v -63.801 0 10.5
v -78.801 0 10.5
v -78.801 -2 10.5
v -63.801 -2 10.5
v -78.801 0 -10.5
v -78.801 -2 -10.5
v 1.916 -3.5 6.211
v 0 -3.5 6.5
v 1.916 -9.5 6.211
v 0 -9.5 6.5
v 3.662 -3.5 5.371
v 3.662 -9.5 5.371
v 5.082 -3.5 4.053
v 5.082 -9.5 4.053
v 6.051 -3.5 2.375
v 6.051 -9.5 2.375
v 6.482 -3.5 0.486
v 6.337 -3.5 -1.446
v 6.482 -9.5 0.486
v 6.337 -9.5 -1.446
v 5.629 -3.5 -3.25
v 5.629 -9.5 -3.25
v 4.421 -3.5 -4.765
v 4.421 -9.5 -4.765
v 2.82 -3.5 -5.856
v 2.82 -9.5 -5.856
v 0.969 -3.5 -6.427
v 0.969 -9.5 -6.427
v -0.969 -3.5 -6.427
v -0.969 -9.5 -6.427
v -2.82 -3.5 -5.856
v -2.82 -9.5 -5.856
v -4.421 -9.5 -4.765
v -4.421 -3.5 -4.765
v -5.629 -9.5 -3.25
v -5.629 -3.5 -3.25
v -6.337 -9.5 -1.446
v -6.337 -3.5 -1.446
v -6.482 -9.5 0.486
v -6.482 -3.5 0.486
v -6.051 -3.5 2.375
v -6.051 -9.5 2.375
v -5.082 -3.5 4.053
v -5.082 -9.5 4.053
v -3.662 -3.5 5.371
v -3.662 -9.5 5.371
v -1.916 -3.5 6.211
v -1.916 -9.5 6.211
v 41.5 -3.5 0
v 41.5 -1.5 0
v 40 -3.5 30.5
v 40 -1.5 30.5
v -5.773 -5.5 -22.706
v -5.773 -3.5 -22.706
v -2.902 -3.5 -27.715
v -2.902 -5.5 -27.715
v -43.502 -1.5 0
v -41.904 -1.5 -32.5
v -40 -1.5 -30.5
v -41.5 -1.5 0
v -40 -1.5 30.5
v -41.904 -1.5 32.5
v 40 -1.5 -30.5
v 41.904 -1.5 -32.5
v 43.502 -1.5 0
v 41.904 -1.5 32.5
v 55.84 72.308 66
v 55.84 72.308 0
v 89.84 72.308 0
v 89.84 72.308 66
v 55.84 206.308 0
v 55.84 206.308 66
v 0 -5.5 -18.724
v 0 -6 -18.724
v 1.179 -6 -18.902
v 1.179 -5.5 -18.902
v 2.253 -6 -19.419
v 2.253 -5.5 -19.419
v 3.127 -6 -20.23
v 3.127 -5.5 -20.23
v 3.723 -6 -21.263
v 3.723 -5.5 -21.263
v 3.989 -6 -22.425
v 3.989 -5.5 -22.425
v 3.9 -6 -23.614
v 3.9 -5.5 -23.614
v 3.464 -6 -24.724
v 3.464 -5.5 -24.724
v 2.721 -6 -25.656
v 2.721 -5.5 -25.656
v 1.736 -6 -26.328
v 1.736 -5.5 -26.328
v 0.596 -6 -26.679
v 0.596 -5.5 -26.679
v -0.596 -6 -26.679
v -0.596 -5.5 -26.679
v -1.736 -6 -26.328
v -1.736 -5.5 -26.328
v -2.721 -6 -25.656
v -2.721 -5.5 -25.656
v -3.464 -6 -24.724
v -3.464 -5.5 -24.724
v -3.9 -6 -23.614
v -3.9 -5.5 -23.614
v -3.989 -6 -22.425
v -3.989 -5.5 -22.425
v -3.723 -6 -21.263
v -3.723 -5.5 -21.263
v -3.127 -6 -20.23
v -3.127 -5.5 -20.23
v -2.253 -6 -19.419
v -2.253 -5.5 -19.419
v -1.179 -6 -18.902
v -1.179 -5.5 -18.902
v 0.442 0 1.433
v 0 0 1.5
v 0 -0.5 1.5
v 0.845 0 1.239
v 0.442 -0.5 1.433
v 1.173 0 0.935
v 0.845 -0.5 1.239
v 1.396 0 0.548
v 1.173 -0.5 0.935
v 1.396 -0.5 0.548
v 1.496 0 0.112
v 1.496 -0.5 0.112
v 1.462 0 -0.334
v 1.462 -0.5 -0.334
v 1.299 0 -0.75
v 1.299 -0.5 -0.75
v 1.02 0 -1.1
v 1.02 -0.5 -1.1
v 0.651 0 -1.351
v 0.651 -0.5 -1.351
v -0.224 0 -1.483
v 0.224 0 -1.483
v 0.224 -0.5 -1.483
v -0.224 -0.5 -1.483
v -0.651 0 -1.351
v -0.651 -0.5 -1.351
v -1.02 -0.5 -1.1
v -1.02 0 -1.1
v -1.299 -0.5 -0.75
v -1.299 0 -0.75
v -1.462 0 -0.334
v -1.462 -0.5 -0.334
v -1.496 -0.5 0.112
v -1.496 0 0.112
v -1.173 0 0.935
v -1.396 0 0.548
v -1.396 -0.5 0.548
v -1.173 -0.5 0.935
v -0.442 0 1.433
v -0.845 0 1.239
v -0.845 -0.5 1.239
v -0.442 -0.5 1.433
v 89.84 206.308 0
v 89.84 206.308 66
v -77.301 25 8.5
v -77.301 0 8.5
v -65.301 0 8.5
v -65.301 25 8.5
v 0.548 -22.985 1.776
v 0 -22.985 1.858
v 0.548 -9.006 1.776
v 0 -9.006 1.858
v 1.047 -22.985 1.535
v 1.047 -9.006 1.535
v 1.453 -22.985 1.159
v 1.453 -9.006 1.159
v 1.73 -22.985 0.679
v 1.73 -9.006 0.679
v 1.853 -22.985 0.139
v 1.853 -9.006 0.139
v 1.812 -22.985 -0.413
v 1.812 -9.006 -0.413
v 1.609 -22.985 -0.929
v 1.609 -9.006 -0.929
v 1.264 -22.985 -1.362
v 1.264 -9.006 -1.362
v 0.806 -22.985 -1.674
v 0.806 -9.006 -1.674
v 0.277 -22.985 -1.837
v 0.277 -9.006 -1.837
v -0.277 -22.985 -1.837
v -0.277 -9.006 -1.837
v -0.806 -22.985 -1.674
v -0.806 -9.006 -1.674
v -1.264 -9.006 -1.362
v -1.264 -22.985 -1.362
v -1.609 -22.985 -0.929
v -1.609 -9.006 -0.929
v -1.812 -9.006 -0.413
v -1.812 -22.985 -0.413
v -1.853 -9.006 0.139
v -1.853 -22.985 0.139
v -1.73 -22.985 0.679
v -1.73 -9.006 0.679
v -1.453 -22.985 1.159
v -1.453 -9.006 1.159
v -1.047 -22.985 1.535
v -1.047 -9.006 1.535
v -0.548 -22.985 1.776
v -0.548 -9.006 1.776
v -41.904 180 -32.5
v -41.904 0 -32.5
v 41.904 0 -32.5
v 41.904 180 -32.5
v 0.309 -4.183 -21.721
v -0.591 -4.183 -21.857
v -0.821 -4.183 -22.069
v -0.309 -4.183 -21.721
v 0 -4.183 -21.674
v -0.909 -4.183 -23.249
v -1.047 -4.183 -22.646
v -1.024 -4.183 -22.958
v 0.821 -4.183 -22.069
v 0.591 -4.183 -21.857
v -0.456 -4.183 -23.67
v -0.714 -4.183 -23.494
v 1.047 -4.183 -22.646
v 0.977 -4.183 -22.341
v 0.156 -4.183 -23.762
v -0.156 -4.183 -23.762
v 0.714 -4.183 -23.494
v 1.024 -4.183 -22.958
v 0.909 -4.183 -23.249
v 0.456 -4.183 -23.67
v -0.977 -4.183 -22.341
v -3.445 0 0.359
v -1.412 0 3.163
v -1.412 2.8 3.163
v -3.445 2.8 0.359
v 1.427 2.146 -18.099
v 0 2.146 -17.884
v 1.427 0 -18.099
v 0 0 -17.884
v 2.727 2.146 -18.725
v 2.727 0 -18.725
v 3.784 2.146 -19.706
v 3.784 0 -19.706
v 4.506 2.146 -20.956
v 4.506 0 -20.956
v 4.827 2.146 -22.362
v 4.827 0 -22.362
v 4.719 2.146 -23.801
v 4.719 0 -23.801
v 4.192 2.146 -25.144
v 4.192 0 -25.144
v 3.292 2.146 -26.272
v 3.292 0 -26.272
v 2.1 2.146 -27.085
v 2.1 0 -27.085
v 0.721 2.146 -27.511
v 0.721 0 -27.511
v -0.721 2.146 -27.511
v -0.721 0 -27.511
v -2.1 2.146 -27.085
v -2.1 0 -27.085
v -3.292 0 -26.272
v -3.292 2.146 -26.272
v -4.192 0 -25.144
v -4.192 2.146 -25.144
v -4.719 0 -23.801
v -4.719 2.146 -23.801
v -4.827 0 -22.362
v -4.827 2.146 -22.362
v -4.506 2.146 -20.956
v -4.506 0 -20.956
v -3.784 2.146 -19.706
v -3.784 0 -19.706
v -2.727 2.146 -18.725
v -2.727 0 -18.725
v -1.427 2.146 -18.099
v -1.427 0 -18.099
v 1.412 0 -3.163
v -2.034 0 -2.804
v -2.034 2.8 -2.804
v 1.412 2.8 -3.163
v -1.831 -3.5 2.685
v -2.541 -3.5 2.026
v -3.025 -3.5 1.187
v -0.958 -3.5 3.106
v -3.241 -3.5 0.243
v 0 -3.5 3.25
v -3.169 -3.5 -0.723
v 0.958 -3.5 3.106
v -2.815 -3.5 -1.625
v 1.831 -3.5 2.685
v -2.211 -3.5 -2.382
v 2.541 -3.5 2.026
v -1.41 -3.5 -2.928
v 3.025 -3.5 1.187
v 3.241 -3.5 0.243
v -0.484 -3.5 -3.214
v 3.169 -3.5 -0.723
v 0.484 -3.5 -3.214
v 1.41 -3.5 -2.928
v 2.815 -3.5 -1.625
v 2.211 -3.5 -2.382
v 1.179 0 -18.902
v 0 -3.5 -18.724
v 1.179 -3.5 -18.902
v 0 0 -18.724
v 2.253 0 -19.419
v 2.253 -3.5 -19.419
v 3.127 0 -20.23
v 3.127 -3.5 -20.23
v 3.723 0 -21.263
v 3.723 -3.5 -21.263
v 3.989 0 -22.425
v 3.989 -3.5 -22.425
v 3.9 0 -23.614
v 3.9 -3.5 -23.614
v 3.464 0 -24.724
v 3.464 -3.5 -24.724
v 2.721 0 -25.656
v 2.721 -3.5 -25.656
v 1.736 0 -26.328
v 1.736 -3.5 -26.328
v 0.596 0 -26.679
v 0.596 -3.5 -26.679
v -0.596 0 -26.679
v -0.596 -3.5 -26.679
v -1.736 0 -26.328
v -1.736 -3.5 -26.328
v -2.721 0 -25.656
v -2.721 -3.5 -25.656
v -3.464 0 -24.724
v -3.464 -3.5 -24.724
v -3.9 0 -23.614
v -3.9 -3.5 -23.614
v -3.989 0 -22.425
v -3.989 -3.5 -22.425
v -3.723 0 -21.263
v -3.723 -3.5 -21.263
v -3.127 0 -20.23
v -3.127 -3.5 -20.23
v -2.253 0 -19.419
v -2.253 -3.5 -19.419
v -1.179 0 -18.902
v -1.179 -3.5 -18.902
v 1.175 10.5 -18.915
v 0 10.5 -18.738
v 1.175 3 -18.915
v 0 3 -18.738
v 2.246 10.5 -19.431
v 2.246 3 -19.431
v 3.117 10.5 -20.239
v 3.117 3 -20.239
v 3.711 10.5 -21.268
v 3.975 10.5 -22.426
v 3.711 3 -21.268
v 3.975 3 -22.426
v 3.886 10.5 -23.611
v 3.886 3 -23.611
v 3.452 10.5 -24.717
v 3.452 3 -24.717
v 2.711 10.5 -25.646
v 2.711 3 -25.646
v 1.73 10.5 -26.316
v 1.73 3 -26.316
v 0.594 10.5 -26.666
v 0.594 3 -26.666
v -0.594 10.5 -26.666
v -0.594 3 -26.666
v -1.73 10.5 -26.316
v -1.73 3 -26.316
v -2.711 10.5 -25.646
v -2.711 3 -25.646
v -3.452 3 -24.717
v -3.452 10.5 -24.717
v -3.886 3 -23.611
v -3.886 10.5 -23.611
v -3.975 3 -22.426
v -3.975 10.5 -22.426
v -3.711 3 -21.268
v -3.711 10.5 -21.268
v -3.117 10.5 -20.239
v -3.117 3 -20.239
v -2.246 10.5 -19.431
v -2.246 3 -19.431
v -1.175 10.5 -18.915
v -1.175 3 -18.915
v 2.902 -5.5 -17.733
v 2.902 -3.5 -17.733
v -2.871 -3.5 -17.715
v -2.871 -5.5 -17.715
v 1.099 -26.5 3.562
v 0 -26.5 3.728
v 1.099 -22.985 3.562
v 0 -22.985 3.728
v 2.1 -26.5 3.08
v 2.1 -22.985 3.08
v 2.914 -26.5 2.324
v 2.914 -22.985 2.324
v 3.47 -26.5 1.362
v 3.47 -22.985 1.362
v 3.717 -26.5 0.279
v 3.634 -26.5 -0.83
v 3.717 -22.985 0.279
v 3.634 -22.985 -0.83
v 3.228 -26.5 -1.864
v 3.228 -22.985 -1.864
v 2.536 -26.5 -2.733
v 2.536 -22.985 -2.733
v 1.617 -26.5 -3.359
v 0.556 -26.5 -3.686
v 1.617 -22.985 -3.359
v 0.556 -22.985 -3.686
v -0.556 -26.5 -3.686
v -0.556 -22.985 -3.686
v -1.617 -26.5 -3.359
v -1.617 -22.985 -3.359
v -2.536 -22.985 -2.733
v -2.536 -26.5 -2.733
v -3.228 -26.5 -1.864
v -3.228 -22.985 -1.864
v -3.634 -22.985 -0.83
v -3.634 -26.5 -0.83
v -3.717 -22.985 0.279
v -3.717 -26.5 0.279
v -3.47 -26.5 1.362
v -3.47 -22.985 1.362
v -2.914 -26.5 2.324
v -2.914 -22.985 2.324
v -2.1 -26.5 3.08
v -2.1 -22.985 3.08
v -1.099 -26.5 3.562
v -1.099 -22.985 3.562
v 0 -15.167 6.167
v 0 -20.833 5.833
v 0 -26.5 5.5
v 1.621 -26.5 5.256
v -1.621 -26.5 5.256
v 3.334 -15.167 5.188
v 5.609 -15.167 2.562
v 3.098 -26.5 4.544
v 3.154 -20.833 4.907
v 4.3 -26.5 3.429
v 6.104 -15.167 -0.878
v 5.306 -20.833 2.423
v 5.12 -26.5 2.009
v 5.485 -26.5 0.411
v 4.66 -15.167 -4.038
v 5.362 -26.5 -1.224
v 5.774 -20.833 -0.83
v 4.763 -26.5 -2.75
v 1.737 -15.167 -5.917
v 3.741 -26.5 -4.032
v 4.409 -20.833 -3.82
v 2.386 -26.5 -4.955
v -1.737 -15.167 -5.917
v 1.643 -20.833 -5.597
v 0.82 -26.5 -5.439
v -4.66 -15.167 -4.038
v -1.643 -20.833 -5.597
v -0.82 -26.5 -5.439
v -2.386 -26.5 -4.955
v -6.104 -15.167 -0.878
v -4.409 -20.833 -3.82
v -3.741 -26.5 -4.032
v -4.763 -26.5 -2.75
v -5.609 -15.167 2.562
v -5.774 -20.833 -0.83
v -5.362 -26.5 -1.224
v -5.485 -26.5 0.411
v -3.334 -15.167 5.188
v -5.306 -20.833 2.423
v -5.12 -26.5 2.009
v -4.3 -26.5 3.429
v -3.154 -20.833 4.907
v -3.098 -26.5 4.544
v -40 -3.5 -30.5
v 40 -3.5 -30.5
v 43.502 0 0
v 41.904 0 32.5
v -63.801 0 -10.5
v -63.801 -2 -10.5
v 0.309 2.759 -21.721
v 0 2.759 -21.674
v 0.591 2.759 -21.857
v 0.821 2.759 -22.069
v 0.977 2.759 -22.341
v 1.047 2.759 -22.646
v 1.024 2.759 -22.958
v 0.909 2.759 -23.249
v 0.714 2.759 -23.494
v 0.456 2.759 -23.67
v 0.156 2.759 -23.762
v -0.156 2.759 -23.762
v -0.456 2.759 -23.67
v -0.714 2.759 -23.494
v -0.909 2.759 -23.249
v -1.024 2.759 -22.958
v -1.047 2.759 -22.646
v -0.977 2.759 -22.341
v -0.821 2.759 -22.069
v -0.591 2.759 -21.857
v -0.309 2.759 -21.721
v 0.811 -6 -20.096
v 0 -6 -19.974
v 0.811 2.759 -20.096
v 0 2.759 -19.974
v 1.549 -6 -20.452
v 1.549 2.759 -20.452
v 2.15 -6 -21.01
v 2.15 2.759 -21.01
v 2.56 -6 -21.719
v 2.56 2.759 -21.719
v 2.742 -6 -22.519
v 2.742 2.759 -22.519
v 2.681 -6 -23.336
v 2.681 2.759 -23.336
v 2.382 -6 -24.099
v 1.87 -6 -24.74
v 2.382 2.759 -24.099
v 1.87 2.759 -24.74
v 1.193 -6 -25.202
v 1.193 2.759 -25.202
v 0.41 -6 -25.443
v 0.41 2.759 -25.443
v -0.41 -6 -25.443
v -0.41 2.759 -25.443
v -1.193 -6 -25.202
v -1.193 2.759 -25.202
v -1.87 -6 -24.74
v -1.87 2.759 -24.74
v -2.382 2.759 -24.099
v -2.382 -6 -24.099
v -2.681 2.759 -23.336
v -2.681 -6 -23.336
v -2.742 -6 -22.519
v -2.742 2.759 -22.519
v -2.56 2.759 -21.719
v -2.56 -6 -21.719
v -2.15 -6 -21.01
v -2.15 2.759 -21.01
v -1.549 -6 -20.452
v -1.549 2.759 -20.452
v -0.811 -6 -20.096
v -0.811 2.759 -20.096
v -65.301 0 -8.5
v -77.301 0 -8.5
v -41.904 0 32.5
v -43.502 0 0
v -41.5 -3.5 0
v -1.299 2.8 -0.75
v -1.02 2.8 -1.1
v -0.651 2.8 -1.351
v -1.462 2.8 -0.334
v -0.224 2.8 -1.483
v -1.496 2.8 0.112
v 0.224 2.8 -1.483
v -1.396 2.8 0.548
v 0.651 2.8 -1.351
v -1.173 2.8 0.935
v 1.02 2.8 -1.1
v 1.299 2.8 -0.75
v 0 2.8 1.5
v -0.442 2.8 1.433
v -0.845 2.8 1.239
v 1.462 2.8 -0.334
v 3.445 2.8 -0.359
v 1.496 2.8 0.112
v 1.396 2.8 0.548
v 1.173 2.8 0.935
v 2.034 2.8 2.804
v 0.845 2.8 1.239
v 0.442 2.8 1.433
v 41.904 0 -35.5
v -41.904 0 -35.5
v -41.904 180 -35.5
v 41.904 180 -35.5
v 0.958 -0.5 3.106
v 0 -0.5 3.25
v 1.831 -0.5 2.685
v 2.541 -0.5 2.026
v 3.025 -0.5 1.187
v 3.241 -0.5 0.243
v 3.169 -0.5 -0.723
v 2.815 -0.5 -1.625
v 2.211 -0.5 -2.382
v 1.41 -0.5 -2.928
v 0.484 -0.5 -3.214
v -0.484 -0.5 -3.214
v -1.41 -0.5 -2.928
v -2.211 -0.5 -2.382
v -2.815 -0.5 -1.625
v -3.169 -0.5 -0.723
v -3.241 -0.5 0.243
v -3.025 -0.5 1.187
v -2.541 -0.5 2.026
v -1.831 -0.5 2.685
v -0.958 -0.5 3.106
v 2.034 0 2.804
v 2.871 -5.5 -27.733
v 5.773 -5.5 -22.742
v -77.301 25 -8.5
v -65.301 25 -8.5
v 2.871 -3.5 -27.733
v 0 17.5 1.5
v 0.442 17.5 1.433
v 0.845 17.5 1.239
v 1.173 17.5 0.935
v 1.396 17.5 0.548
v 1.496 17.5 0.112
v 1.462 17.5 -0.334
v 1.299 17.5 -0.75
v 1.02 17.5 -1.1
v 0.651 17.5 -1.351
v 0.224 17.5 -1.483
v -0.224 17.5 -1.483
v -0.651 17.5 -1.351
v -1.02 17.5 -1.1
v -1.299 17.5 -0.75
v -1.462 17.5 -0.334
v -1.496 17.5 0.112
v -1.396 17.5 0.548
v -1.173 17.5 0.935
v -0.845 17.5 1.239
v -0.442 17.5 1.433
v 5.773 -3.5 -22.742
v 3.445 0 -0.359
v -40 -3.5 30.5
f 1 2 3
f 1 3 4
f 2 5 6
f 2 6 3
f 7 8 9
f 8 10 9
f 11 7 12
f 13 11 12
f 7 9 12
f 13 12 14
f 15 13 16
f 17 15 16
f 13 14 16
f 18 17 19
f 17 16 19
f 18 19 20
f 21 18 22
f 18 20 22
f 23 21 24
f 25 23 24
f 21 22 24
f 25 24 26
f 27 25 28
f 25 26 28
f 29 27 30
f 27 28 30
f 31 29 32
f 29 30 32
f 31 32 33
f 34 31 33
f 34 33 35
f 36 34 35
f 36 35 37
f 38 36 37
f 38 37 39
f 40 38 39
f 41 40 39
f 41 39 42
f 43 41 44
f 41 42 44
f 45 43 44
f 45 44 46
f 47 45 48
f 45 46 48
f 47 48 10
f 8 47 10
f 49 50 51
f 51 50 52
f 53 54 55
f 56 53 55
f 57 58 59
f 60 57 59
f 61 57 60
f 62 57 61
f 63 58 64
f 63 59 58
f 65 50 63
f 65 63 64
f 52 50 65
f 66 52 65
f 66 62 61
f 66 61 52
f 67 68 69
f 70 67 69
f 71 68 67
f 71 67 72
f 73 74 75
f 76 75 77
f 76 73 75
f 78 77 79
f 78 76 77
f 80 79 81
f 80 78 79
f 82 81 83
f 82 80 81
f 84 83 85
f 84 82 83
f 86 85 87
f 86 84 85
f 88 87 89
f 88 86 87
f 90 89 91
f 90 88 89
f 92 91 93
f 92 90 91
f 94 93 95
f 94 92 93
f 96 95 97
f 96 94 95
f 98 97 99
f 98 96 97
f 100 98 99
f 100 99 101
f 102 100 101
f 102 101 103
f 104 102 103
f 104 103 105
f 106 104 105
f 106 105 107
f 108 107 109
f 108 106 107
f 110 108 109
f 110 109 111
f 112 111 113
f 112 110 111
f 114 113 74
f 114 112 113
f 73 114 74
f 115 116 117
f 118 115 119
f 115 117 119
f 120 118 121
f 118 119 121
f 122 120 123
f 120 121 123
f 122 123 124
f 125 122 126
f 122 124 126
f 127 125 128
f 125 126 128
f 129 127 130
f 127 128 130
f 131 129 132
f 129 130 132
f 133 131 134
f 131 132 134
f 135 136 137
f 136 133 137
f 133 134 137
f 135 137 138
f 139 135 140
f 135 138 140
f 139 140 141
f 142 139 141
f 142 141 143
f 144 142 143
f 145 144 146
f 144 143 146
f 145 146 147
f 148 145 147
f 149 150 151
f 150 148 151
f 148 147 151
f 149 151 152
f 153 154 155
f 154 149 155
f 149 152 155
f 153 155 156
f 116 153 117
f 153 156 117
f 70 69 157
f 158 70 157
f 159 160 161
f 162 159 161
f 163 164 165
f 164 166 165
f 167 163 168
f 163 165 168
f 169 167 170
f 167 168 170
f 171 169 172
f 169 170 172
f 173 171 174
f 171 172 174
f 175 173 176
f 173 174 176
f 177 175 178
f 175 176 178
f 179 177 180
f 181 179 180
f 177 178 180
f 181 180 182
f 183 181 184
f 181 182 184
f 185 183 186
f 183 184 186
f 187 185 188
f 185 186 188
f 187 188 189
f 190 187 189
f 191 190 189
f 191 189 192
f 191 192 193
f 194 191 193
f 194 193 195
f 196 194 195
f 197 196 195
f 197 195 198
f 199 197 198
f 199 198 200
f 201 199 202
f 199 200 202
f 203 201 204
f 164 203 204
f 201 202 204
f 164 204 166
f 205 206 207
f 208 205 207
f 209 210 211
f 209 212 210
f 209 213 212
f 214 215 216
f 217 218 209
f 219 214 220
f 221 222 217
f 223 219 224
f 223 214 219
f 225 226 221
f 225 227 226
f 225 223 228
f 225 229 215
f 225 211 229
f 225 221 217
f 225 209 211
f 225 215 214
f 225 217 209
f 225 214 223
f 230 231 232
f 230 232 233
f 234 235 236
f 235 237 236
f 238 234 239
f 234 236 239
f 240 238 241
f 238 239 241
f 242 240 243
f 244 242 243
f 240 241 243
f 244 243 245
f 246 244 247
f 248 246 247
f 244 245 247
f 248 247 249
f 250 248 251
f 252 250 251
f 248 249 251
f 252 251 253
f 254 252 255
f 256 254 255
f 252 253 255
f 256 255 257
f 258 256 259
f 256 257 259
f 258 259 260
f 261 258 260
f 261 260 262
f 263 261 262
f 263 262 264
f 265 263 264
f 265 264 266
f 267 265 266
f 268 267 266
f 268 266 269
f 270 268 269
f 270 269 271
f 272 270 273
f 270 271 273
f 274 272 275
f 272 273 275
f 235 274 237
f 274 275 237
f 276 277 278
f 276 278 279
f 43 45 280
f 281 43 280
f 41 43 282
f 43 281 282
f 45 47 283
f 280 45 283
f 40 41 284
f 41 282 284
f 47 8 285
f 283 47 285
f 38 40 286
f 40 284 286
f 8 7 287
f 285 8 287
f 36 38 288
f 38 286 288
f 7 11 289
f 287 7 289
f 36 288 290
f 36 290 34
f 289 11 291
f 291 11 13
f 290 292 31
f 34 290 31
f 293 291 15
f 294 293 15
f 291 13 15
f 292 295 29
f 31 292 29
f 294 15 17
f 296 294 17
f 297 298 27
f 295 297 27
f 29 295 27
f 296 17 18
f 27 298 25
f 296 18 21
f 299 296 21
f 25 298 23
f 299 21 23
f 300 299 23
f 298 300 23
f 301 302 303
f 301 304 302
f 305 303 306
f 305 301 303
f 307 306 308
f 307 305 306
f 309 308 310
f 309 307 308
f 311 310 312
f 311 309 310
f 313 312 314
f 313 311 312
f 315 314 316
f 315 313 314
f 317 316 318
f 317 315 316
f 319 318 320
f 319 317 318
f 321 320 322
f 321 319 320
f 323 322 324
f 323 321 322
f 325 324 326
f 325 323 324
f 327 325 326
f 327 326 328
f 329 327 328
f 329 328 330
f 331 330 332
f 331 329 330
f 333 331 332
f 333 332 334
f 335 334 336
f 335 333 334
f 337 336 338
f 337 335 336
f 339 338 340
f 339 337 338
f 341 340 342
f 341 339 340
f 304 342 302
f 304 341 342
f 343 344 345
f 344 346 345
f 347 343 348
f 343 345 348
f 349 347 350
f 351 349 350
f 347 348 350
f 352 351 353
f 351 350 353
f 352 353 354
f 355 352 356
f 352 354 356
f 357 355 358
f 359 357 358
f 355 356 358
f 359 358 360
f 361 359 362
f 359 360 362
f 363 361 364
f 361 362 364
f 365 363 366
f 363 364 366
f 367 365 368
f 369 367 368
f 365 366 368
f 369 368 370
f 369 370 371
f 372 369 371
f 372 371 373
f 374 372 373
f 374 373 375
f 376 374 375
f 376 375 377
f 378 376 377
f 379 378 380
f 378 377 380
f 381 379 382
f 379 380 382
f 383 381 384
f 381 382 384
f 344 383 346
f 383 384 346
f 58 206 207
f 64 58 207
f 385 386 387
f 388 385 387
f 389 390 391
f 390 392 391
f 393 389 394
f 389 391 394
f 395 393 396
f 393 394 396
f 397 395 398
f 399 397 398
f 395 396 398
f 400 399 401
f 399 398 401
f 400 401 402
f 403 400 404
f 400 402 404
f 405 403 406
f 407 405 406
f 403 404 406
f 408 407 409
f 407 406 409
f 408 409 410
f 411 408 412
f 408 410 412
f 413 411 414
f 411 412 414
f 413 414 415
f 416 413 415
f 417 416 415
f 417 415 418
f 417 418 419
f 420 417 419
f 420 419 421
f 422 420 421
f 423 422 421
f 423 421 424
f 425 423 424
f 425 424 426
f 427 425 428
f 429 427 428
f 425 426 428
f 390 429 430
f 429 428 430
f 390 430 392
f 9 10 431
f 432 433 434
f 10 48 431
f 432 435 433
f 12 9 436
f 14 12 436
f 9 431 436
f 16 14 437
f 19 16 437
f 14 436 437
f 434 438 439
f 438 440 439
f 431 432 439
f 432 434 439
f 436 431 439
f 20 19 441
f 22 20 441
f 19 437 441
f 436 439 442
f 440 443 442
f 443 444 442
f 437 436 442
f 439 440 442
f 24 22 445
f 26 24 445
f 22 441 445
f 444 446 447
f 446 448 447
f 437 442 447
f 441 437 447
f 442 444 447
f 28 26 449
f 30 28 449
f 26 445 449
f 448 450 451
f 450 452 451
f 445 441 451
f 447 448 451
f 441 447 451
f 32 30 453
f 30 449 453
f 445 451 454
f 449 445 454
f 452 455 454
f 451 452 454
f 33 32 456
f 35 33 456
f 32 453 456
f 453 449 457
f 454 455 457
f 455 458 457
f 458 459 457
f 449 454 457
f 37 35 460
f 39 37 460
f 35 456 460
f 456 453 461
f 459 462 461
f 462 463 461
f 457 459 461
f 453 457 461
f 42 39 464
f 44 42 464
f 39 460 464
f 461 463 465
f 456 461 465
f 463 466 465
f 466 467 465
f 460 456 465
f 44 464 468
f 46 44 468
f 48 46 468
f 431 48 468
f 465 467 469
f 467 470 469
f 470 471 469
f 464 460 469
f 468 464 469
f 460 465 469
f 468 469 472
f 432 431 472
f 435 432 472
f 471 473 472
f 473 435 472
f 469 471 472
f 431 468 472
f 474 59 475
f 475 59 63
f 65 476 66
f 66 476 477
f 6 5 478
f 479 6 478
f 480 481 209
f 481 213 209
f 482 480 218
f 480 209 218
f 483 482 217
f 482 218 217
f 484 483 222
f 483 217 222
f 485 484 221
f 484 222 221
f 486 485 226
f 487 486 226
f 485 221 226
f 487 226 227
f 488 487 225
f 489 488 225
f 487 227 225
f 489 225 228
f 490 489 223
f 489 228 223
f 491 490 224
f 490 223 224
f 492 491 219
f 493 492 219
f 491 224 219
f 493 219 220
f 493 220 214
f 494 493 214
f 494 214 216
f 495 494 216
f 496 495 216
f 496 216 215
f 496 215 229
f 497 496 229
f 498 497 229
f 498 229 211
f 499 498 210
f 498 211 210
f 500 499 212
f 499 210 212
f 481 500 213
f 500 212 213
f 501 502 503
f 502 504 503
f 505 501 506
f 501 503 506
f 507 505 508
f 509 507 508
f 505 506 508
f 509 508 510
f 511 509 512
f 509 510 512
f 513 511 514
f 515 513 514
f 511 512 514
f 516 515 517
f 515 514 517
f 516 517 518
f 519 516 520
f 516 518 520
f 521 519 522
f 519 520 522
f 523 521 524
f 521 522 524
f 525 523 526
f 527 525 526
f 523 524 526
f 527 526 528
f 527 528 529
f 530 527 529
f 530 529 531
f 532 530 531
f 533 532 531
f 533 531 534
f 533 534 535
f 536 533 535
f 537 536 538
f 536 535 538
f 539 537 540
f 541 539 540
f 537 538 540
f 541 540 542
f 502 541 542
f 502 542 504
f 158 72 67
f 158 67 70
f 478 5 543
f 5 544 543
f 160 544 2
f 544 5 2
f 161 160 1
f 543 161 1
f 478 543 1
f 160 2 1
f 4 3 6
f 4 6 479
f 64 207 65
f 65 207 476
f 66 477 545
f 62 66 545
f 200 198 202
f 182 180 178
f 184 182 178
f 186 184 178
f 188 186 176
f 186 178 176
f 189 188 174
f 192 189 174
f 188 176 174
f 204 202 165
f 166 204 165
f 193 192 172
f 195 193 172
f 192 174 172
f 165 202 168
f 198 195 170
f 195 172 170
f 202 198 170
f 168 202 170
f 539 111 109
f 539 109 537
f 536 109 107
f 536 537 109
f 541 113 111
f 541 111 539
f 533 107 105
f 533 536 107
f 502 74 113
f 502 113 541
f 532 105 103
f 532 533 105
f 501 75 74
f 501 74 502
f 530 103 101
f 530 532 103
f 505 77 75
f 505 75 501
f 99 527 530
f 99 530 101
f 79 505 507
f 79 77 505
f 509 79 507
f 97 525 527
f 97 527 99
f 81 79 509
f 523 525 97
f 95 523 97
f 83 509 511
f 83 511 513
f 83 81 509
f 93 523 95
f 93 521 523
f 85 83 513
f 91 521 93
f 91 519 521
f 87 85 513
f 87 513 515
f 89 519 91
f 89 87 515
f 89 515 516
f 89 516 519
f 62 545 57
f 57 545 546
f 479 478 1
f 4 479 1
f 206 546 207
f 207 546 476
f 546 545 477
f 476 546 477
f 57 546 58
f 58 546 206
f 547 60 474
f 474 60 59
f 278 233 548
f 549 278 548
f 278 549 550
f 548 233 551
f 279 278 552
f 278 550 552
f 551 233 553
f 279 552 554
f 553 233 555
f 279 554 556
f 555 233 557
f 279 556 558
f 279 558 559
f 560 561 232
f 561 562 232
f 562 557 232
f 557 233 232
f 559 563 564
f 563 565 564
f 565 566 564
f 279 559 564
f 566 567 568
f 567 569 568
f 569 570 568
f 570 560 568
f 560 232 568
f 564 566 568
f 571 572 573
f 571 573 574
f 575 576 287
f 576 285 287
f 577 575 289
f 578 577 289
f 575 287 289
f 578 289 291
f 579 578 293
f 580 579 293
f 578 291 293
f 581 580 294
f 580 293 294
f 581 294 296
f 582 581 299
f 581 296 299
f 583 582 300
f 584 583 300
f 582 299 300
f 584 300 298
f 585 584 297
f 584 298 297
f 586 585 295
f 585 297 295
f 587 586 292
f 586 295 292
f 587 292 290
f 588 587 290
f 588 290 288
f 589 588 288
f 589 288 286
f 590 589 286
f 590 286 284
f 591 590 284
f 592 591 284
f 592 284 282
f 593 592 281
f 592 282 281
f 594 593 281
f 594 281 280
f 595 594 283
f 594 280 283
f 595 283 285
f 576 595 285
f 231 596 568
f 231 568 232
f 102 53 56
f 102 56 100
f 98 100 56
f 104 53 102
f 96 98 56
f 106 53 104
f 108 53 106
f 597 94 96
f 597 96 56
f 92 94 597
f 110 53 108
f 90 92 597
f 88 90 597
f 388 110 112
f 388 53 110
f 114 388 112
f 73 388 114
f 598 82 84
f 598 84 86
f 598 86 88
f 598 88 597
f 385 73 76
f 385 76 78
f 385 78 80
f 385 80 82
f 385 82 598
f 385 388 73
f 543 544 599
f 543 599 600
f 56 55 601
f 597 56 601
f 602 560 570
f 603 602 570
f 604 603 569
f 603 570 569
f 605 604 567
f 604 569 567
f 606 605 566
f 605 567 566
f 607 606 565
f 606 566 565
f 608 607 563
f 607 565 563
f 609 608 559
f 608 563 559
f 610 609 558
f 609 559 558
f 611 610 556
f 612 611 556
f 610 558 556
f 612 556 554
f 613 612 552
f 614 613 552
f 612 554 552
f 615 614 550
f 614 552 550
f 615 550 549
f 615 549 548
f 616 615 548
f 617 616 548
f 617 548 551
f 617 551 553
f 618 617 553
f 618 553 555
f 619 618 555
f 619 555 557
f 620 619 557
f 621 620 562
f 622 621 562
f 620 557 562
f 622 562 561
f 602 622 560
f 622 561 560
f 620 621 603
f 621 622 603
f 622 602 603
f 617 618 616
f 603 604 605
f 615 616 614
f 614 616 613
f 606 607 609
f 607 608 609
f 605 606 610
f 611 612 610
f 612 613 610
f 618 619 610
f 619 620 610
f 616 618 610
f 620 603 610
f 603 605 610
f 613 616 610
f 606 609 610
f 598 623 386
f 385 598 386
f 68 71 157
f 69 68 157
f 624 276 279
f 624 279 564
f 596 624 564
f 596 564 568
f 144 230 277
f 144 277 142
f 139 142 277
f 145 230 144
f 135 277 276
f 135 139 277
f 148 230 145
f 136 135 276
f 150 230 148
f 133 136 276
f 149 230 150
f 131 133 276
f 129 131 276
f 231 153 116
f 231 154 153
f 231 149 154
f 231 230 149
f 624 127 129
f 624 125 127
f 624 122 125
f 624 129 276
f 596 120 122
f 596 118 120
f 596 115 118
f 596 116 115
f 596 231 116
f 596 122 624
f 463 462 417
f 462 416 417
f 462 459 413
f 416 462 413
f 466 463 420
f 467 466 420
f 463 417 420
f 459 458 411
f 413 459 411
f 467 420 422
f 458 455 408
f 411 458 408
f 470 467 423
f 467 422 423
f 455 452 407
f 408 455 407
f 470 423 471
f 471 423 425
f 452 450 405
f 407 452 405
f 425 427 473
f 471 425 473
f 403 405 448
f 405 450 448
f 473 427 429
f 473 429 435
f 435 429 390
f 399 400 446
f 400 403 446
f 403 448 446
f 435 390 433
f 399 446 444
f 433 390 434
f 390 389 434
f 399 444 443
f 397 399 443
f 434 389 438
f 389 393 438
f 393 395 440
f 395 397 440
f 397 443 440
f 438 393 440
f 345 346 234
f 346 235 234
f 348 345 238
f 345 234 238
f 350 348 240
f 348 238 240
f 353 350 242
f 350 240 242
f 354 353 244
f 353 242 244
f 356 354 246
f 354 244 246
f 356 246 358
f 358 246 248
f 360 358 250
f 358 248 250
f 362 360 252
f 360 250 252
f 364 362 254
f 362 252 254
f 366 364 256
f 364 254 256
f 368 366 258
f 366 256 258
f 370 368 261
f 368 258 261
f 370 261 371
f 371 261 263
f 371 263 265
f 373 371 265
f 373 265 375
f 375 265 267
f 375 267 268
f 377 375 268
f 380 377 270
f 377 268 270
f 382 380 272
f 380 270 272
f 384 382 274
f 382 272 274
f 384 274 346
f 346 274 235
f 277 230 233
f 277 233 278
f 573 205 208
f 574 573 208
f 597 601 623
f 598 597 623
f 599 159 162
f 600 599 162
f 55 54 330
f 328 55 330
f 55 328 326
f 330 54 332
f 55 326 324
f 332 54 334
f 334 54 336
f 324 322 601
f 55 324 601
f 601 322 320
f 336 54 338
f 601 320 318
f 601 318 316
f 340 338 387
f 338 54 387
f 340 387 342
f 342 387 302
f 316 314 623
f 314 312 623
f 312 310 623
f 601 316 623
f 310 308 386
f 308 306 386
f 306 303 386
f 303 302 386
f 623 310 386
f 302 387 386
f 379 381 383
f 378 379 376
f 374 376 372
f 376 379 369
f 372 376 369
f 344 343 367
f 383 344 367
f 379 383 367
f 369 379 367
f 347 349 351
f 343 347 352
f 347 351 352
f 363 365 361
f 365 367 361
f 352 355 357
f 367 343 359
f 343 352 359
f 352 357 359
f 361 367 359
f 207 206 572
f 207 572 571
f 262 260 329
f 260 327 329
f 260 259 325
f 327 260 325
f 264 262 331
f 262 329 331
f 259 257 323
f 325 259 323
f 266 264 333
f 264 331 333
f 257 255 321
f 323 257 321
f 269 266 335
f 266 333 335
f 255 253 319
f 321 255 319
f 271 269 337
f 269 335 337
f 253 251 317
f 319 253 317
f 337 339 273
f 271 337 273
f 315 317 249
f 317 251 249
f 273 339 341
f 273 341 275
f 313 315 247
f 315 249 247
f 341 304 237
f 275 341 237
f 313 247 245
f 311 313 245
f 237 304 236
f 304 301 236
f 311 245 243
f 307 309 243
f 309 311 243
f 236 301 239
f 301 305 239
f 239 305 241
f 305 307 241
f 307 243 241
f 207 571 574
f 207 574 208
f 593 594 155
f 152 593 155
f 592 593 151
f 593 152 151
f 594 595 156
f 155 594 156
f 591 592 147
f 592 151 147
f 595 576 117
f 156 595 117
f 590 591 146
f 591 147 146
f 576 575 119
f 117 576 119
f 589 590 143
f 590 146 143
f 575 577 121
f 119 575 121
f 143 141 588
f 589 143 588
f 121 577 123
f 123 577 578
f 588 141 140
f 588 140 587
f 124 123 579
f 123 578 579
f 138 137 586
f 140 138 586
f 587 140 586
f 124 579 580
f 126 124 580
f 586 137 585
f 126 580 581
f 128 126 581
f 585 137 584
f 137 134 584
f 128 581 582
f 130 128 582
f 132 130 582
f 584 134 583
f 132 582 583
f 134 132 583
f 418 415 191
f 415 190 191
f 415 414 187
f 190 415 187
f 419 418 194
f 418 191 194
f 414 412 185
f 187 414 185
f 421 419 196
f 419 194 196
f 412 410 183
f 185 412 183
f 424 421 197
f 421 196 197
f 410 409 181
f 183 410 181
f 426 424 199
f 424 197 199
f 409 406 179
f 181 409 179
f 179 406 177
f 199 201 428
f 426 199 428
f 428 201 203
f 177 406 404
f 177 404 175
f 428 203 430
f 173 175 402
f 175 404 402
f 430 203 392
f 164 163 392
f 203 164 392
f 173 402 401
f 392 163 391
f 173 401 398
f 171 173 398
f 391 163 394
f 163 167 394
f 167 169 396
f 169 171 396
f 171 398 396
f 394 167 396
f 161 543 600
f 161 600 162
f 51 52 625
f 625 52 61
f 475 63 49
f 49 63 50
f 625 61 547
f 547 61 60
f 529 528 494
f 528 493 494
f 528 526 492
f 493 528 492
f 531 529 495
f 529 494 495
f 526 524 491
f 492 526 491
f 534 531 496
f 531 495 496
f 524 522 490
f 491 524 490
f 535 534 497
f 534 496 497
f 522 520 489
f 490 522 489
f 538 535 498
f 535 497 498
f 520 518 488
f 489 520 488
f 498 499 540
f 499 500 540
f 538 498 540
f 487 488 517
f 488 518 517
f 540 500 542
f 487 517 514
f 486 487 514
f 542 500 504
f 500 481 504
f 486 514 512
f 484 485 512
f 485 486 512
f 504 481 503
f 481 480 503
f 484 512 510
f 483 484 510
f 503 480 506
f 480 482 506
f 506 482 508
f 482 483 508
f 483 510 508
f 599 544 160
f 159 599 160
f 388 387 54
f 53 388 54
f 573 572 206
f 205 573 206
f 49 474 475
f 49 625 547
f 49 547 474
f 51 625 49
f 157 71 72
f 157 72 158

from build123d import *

# Parameters (mm, degrees)
F1_DEPTH  = 3.5
F2_DEPTH  = 1.5
F0_W      = 12
F0_H      = 17
F3_DEPTH  = 25
F0_W_2    = 15
F0_H_2    = 21
F4_DEPTH  = 2
F5_W      = 4.1825124063
F5_H      = 1.05
F5_W_2    = 2.7589036617
F5_W_3    = 6
F5_H_2    = 1.25
F8_R      = 4
F9_DEPTH  = 2
F11_DEPTH = 2.8
F12_W     = 34
F12_H     = 134
F13_DEPTH = 66
F14_W     = 83.8081131763
F14_H     = 3
F15_DEPTH = 180


with BuildPart() as f1:
    # F0 (on Front) → F1 (new body)
    with BuildSketch(Plane.XZ):
        Polygon((-40, -30.5), (40, -30.5), (41.5, 0), (40, 30.5), (-40, 30.5), (-41.5, 0), align=None)
    extrude(amount=F1_DEPTH)

    # F0 (on Front) → F2 (join)
    with BuildSketch(Plane.XZ):
        Polygon((43.5024172439, 0), (41.9040565881, 32.5), (-41.9040565881, 32.5), (-43.5024172439, 0), (-41.9040565881, -32.5), (41.9040565881, -32.5), align=None)
        Polygon((41.5, 0), (40, -30.5), (-40, -30.5), (-41.5, 0), (-40, 30.5), (40, 30.5), align=None, mode=Mode.SUBTRACT)
    extrude(amount=F2_DEPTH)


with BuildPart() as f3:
    # F0 (on Front) → F3 (new body)
    with BuildSketch(Plane.XZ):
        with Locations((-71.3006779552, 0)):
            Rectangle(F0_W, F0_H)
    extrude(amount=-F3_DEPTH)

    # F0 (on Front) → F4 (join)
    with BuildSketch(Plane.XZ):
        with Locations((-71.3006779552, 0)):
            Rectangle(F0_W_2, F0_H_2)
        with Locations((-71.3006779552, 0)):
            Rectangle(F0_W, F0_H, mode=Mode.SUBTRACT)
        with Locations((-71.3006779552, 0)):
            Rectangle(F0_W, F0_H)
    extrude(amount=F4_DEPTH)


with BuildPart() as f6:
    # F5 (on Right) → F6 (revolve)
    with BuildSketch(Plane.YZ):
        Polygon((-3.5, 3.25), (-3.5, 6.5), (-9.5, 6.5), (-26.5, 5.5), (-26.5, 3.727769712), (-22.9847636074, 3.727769712), (-22.9847636074, 1.8582198536), (-9.006283246, 1.8582198536), (-9.006283246, 0), (-3.5, 0), align=None)
        Polygon((-0.5, 3.25), (-3.5, 3.25), (-3.5, 0), (-0.5, 0), (-0.5, 1.5), align=None)
        Polygon((-0.5, 1.5), (-0.5, 0), (0, 0), (17.5, 0), (17.5, 1.5), align=None)
    revolve(axis=Axis((0, -15, 0), (0, 1, 0)))

    # F10 (on face) → F11 (join)
    with BuildSketch(Plane.XZ):
        Polygon((-1.4117720832, 3.1633683923), (-3.4454434308, 0.3590537077), (-2.0336713476, -2.8043146845), (1.4117720832, -3.1633683923), (3.4454434308, -0.3590537077), (2.0336713476, 2.8043146845), align=None)
    extrude(amount=-F11_DEPTH)


with BuildPart() as f7:
    # F5 (on Right) → F7 (revolve)
    with BuildSketch(Plane.YZ):
        with Locations((-2.0912562031, -22.1991609246)):
            Rectangle(F5_W, F5_H)
        with Locations((1.3794518309, -22.1991609246)):
            Rectangle(F5_W_2, F5_H)
        Polygon((2.1458028089, -17.8837124258), (0, -17.8837124258), (0, -18.7241609246), (0, -19.9741609246), (2.7589036617, -19.9741609246), (2.7589036617, -21.6741609246), (2.7589036617, -22.7241609246), (10.5, -22.7241609246), (10.5, -18.7379103154), (3, -18.7379103154), align=None)
        with Locations((-3, -19.3491609246)):
            Rectangle(F5_W_3, F5_H_2)
    revolve(axis=Axis((0, 3.4161561243, -22.7241609246), (0, 1, 0)))

    # F8 (on face) → F9 (join)
    with BuildSketch(Plane.XZ.offset(3.5)):
        Polygon((5.7734741162, -22.7423257935), (2.9024682961, -17.7332681063), (-2.8710058201, -17.7151032373), (-5.7734741162, -22.7059960556), (-2.9024682961, -27.7150537428), (2.8710058201, -27.7332186118), align=None)
        with Locations((0, -22.7241609246)):
            Circle(F8_R, mode=Mode.SUBTRACT)
    extrude(amount=F9_DEPTH)


with BuildPart() as f13:
    # F12 (on Top) → F13 (new body)
    with BuildSketch(Plane.XY):
        with Locations((72.8403810198, 139.3083352596)):
            Rectangle(F12_W, F12_H)
    extrude(amount=F13_DEPTH)


with BuildPart() as f15:
    # F14 (on Front) → F15 (new body)
    with BuildSketch(Plane.XZ):
        with Locations((0, -34)):
            Rectangle(F14_W, F14_H)
    extrude(amount=-F15_DEPTH)


solid = Compound([f1.part, f3.part, f6.part, f7.part, f13.part, f15.part])
